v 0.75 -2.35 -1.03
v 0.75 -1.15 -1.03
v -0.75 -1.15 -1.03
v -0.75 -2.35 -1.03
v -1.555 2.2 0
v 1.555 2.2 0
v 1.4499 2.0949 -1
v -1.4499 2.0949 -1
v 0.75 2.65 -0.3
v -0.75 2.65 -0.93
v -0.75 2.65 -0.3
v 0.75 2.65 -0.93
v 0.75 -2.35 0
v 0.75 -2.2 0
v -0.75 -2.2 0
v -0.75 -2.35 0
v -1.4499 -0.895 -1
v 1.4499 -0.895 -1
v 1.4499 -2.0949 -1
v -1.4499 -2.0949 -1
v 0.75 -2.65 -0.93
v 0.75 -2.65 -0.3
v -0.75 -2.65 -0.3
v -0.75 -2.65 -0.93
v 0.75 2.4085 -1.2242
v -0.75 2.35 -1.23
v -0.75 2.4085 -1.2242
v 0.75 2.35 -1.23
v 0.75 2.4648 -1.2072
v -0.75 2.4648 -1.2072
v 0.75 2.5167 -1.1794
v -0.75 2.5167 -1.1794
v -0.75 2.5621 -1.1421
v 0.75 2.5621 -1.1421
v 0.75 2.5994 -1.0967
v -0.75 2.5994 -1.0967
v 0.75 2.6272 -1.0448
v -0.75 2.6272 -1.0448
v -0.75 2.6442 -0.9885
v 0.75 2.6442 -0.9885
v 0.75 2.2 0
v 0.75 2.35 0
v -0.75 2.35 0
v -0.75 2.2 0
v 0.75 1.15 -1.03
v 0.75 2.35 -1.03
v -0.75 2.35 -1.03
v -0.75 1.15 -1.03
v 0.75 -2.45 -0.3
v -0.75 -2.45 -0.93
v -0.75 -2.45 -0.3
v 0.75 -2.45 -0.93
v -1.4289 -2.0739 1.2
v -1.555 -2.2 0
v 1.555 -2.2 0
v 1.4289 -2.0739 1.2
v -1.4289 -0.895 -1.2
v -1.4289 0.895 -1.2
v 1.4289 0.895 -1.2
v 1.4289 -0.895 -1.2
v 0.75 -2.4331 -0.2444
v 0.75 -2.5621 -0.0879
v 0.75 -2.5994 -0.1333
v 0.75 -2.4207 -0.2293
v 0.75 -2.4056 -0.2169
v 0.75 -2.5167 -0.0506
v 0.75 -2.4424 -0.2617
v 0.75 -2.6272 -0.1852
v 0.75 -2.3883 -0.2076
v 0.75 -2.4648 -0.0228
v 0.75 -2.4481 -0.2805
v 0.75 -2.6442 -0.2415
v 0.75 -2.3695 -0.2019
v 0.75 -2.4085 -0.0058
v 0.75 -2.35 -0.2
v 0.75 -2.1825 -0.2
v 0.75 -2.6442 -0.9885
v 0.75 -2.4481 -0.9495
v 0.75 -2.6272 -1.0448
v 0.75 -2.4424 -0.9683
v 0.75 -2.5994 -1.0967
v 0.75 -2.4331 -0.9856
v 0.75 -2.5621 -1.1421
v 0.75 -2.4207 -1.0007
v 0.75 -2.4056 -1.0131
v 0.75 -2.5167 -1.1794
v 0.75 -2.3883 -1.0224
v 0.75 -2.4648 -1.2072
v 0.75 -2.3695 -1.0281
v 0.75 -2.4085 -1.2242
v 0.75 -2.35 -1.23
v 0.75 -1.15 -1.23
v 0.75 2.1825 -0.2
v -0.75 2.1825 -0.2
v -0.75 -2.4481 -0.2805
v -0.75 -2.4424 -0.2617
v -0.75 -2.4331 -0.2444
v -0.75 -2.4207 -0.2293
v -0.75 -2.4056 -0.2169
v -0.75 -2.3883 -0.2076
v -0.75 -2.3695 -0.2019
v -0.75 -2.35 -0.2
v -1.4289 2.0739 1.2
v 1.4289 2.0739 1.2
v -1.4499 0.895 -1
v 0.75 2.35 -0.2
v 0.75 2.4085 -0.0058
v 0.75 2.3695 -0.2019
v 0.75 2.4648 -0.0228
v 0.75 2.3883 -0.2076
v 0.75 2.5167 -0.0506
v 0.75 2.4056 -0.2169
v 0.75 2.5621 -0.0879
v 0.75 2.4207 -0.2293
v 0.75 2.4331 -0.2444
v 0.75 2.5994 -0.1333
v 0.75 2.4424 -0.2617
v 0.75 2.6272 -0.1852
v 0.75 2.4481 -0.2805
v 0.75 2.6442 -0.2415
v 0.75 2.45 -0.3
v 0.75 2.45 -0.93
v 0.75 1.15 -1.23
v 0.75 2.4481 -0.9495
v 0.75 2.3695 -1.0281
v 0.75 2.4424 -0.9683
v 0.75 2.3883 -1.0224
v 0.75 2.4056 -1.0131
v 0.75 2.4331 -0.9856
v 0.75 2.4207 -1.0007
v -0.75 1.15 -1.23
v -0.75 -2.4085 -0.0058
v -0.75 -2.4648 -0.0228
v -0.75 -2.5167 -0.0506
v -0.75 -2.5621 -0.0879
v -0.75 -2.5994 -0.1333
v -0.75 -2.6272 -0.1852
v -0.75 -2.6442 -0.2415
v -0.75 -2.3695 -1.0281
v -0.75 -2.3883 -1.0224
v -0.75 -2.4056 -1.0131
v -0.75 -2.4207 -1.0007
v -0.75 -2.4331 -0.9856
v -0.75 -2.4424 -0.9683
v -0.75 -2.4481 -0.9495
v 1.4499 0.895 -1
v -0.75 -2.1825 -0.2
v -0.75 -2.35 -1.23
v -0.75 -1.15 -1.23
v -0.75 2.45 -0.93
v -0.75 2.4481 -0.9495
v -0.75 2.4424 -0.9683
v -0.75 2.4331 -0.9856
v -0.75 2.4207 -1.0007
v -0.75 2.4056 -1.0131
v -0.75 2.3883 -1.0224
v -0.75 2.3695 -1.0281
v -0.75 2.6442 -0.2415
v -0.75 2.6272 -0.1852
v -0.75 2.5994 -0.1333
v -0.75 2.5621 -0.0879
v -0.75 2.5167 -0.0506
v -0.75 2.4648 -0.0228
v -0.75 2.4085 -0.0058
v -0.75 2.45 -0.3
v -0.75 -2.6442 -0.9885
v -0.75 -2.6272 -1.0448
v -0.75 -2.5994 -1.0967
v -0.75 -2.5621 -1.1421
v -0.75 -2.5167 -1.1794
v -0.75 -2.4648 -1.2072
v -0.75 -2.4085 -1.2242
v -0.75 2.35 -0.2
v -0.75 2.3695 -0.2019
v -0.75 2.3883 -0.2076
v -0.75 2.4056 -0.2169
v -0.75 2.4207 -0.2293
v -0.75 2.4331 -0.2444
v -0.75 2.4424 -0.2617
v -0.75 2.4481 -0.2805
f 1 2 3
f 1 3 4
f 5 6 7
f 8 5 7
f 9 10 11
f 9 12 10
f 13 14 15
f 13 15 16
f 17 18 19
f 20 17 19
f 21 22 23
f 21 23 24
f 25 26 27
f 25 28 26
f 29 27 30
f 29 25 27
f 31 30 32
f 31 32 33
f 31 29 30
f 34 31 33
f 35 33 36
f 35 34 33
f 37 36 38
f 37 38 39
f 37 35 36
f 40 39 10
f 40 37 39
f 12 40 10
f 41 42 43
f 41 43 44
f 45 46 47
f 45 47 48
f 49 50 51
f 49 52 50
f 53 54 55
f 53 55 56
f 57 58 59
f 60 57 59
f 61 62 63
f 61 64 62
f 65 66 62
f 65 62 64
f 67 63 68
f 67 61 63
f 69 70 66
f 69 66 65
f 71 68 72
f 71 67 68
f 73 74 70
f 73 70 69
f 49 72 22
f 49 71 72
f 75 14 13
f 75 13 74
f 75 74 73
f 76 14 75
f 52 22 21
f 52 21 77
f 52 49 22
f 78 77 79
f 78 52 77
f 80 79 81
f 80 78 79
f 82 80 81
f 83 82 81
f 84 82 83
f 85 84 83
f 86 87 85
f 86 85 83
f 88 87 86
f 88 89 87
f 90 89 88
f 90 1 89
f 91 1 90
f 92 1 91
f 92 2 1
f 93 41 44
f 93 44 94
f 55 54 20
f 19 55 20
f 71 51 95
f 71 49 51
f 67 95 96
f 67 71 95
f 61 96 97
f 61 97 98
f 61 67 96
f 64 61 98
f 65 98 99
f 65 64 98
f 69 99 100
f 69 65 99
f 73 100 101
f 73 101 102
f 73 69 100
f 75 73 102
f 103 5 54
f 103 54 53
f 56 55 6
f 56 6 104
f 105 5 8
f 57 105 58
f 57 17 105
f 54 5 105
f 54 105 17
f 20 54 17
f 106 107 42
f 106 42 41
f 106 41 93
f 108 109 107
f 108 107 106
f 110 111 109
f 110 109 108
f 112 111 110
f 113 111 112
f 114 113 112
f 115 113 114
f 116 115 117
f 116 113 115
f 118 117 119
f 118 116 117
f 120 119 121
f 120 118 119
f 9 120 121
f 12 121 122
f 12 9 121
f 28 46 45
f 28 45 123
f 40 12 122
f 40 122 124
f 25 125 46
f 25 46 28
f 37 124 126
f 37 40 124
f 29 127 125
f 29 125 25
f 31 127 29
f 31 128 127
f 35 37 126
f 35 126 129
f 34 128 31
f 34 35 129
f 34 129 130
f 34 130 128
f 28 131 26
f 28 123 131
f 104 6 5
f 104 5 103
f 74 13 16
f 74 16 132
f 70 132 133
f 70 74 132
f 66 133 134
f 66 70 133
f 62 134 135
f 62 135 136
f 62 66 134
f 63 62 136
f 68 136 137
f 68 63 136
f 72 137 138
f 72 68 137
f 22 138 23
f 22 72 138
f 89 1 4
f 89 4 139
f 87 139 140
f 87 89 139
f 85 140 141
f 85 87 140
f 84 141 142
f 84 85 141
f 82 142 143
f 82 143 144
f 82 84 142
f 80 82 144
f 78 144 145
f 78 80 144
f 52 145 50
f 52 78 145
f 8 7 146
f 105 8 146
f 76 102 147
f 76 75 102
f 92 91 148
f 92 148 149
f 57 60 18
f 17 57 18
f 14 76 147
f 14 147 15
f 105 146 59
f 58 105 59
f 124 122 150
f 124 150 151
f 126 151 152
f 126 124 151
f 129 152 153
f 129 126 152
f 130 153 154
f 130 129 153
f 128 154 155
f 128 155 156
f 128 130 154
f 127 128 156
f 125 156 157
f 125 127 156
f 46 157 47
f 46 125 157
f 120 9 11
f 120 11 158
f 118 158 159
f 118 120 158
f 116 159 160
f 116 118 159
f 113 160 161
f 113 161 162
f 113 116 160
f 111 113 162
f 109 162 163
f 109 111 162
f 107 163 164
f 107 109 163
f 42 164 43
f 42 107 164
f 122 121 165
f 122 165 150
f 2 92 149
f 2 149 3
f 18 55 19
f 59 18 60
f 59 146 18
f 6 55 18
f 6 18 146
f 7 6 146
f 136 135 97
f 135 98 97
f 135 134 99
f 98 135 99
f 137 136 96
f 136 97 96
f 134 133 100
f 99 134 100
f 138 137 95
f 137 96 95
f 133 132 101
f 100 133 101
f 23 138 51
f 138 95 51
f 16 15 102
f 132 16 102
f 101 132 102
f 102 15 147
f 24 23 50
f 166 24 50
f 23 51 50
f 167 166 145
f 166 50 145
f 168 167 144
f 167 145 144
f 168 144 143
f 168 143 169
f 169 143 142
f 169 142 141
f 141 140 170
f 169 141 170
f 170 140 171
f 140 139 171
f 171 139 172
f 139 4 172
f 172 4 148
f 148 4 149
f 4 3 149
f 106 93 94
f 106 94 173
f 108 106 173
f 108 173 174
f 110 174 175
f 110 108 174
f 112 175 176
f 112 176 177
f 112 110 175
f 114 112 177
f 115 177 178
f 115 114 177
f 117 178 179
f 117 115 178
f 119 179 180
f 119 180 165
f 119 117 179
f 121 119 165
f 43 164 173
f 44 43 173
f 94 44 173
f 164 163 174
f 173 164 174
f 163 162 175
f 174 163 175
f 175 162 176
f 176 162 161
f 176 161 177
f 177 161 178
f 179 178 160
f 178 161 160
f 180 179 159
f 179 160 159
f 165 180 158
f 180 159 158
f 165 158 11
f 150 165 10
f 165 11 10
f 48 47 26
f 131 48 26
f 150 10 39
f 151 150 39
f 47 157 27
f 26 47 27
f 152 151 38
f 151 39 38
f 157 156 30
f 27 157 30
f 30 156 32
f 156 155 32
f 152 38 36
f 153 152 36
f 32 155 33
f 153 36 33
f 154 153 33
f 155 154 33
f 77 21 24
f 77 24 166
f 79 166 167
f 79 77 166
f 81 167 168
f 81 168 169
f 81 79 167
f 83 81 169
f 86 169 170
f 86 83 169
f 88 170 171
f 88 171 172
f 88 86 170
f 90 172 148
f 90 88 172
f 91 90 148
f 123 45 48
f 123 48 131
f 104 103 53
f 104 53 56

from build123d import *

# Parameters (mm, degrees)
SZKIC1_W                        = 3.11
SZKIC1_H                        = 4.4
DODANIE_WYCI_GNI_CIE1_DEPTH     = 1.2
DODANIE_WYCI_GNI_CIE1_TAPER     = 6
WYTNIJ_WYCI_GNI_CIE1_DEPTH      = 2.555
WYTNIJ_WYCI_GNI_CIE1_DEPTH_BACK = 2.555
DODANIE_WYCI_GNI_CIE2_DEPTH     = 0.75
DODANIE_WYCI_GNI_CIE2_2_DEPTH   = 0.75


with BuildPart() as part:
    # Szkic1 → Dodanie-wyciągnięcie1 (new body)
    with BuildSketch(Plane.XY):
        Rectangle(SZKIC1_W, SZKIC1_H)
    extrude(amount=DODANIE_WYCI_GNI_CIE1_DEPTH, taper=DODANIE_WYCI_GNI_CIE1_TAPER)

    # Lustro1: part across plane


with BuildPart() as part_1:
    add(part.part)
    add(part.part.mirror(Plane(origin=(0, 0, 0), x_dir=(1, 0, 0), z_dir=(0, 0, -1))))

    # Szkic3 → Wytnij-wyciągnięcie1 (cut, two sides)
    with BuildSketch(Plane(origin=(0, 0, 0), x_dir=(0, 0, -1), z_dir=(1, 0, 0))) as wytnij_wyci_gni_cie1_sk:
        Polygon((1.2, -0.895), (1, -0.895), (1, -2.564937585), (1.280608908, -2.564937585), align=None)
        Polygon((1, 0.895), (1.2, 0.895), (1.494406122, 2.600403108), (1, 2.660266328), align=None)
    extrude(amount=WYTNIJ_WYCI_GNI_CIE1_DEPTH, mode=Mode.SUBTRACT)
    extrude(wytnij_wyci_gni_cie1_sk.sketch, amount=-WYTNIJ_WYCI_GNI_CIE1_DEPTH_BACK, mode=Mode.SUBTRACT)


with BuildPart() as body_2:
    # Szkic5 → Dodanie-wyciągnięcie2 (new body, symmetric)
    with BuildSketch(Plane(origin=(0, 0, 0), x_dir=(0, 0, -1), z_dir=(1, 0, 0))):
        with BuildLine():
            Line((0.2, -2.35), (0.2, -2.182502267))
            Line((0.2, -2.182502267), (0, -2.2))
            Line((0, -2.2), (0, -2.35))
            ThreePointArc((0, -2.35), (0.087867966, -2.562132034), (0.3, -2.65))
            Line((0.3, -2.65), (0.93, -2.65))
            ThreePointArc((0.93, -2.65), (1.142132034, -2.562132034), (1.23, -2.35))
            Line((1.23, -2.35), (1.23, -1.15))
            Line((1.23, -1.15), (1.03, -1.15))
            Line((1.03, -1.15), (1.03, -2.35))
            ThreePointArc((1.03, -2.35), (1.000710678, -2.420710678), (0.93, -2.45))
            Line((0.93, -2.45), (0.3, -2.45))
            ThreePointArc((0.3, -2.45), (0.229289322, -2.420710678), (0.2, -2.35))
        make_face()
    extrude(amount=DODANIE_WYCI_GNI_CIE2_DEPTH, both=True)


with BuildPart() as body_3:
    # Szkic5 → Dodanie-wyci_gni_cie2 2 (new body, symmetric)
    with BuildSketch(Plane(origin=(0, 0, 0), x_dir=(0, 0, -1), z_dir=(1, 0, 0))):
        with BuildLine():
            Line((0.93, 2.65), (0.3, 2.65))
            ThreePointArc((0.3, 2.65), (0.087867966, 2.562132034), (0, 2.35))
            Line((0, 2.35), (0, 2.2))
            Line((0, 2.2), (0.2, 2.182502267))
            Line((0.2, 2.182502267), (0.2, 2.35))
            ThreePointArc((0.2, 2.35), (0.229289322, 2.420710678), (0.3, 2.45))
            Line((0.3, 2.45), (0.93, 2.45))
            ThreePointArc((0.93, 2.45), (1.000710678, 2.420710678), (1.03, 2.35))
            Line((1.03, 2.35), (1.03, 1.15))
            Line((1.03, 1.15), (1.23, 1.15))
            Line((1.23, 1.15), (1.23, 2.35))
            ThreePointArc((1.23, 2.35), (1.142132034, 2.562132034), (0.93, 2.65))
        make_face()
    extrude(amount=DODANIE_WYCI_GNI_CIE2_2_DEPTH, both=True)


solid = Compound([part_1.part, body_2.part, body_3.part])
